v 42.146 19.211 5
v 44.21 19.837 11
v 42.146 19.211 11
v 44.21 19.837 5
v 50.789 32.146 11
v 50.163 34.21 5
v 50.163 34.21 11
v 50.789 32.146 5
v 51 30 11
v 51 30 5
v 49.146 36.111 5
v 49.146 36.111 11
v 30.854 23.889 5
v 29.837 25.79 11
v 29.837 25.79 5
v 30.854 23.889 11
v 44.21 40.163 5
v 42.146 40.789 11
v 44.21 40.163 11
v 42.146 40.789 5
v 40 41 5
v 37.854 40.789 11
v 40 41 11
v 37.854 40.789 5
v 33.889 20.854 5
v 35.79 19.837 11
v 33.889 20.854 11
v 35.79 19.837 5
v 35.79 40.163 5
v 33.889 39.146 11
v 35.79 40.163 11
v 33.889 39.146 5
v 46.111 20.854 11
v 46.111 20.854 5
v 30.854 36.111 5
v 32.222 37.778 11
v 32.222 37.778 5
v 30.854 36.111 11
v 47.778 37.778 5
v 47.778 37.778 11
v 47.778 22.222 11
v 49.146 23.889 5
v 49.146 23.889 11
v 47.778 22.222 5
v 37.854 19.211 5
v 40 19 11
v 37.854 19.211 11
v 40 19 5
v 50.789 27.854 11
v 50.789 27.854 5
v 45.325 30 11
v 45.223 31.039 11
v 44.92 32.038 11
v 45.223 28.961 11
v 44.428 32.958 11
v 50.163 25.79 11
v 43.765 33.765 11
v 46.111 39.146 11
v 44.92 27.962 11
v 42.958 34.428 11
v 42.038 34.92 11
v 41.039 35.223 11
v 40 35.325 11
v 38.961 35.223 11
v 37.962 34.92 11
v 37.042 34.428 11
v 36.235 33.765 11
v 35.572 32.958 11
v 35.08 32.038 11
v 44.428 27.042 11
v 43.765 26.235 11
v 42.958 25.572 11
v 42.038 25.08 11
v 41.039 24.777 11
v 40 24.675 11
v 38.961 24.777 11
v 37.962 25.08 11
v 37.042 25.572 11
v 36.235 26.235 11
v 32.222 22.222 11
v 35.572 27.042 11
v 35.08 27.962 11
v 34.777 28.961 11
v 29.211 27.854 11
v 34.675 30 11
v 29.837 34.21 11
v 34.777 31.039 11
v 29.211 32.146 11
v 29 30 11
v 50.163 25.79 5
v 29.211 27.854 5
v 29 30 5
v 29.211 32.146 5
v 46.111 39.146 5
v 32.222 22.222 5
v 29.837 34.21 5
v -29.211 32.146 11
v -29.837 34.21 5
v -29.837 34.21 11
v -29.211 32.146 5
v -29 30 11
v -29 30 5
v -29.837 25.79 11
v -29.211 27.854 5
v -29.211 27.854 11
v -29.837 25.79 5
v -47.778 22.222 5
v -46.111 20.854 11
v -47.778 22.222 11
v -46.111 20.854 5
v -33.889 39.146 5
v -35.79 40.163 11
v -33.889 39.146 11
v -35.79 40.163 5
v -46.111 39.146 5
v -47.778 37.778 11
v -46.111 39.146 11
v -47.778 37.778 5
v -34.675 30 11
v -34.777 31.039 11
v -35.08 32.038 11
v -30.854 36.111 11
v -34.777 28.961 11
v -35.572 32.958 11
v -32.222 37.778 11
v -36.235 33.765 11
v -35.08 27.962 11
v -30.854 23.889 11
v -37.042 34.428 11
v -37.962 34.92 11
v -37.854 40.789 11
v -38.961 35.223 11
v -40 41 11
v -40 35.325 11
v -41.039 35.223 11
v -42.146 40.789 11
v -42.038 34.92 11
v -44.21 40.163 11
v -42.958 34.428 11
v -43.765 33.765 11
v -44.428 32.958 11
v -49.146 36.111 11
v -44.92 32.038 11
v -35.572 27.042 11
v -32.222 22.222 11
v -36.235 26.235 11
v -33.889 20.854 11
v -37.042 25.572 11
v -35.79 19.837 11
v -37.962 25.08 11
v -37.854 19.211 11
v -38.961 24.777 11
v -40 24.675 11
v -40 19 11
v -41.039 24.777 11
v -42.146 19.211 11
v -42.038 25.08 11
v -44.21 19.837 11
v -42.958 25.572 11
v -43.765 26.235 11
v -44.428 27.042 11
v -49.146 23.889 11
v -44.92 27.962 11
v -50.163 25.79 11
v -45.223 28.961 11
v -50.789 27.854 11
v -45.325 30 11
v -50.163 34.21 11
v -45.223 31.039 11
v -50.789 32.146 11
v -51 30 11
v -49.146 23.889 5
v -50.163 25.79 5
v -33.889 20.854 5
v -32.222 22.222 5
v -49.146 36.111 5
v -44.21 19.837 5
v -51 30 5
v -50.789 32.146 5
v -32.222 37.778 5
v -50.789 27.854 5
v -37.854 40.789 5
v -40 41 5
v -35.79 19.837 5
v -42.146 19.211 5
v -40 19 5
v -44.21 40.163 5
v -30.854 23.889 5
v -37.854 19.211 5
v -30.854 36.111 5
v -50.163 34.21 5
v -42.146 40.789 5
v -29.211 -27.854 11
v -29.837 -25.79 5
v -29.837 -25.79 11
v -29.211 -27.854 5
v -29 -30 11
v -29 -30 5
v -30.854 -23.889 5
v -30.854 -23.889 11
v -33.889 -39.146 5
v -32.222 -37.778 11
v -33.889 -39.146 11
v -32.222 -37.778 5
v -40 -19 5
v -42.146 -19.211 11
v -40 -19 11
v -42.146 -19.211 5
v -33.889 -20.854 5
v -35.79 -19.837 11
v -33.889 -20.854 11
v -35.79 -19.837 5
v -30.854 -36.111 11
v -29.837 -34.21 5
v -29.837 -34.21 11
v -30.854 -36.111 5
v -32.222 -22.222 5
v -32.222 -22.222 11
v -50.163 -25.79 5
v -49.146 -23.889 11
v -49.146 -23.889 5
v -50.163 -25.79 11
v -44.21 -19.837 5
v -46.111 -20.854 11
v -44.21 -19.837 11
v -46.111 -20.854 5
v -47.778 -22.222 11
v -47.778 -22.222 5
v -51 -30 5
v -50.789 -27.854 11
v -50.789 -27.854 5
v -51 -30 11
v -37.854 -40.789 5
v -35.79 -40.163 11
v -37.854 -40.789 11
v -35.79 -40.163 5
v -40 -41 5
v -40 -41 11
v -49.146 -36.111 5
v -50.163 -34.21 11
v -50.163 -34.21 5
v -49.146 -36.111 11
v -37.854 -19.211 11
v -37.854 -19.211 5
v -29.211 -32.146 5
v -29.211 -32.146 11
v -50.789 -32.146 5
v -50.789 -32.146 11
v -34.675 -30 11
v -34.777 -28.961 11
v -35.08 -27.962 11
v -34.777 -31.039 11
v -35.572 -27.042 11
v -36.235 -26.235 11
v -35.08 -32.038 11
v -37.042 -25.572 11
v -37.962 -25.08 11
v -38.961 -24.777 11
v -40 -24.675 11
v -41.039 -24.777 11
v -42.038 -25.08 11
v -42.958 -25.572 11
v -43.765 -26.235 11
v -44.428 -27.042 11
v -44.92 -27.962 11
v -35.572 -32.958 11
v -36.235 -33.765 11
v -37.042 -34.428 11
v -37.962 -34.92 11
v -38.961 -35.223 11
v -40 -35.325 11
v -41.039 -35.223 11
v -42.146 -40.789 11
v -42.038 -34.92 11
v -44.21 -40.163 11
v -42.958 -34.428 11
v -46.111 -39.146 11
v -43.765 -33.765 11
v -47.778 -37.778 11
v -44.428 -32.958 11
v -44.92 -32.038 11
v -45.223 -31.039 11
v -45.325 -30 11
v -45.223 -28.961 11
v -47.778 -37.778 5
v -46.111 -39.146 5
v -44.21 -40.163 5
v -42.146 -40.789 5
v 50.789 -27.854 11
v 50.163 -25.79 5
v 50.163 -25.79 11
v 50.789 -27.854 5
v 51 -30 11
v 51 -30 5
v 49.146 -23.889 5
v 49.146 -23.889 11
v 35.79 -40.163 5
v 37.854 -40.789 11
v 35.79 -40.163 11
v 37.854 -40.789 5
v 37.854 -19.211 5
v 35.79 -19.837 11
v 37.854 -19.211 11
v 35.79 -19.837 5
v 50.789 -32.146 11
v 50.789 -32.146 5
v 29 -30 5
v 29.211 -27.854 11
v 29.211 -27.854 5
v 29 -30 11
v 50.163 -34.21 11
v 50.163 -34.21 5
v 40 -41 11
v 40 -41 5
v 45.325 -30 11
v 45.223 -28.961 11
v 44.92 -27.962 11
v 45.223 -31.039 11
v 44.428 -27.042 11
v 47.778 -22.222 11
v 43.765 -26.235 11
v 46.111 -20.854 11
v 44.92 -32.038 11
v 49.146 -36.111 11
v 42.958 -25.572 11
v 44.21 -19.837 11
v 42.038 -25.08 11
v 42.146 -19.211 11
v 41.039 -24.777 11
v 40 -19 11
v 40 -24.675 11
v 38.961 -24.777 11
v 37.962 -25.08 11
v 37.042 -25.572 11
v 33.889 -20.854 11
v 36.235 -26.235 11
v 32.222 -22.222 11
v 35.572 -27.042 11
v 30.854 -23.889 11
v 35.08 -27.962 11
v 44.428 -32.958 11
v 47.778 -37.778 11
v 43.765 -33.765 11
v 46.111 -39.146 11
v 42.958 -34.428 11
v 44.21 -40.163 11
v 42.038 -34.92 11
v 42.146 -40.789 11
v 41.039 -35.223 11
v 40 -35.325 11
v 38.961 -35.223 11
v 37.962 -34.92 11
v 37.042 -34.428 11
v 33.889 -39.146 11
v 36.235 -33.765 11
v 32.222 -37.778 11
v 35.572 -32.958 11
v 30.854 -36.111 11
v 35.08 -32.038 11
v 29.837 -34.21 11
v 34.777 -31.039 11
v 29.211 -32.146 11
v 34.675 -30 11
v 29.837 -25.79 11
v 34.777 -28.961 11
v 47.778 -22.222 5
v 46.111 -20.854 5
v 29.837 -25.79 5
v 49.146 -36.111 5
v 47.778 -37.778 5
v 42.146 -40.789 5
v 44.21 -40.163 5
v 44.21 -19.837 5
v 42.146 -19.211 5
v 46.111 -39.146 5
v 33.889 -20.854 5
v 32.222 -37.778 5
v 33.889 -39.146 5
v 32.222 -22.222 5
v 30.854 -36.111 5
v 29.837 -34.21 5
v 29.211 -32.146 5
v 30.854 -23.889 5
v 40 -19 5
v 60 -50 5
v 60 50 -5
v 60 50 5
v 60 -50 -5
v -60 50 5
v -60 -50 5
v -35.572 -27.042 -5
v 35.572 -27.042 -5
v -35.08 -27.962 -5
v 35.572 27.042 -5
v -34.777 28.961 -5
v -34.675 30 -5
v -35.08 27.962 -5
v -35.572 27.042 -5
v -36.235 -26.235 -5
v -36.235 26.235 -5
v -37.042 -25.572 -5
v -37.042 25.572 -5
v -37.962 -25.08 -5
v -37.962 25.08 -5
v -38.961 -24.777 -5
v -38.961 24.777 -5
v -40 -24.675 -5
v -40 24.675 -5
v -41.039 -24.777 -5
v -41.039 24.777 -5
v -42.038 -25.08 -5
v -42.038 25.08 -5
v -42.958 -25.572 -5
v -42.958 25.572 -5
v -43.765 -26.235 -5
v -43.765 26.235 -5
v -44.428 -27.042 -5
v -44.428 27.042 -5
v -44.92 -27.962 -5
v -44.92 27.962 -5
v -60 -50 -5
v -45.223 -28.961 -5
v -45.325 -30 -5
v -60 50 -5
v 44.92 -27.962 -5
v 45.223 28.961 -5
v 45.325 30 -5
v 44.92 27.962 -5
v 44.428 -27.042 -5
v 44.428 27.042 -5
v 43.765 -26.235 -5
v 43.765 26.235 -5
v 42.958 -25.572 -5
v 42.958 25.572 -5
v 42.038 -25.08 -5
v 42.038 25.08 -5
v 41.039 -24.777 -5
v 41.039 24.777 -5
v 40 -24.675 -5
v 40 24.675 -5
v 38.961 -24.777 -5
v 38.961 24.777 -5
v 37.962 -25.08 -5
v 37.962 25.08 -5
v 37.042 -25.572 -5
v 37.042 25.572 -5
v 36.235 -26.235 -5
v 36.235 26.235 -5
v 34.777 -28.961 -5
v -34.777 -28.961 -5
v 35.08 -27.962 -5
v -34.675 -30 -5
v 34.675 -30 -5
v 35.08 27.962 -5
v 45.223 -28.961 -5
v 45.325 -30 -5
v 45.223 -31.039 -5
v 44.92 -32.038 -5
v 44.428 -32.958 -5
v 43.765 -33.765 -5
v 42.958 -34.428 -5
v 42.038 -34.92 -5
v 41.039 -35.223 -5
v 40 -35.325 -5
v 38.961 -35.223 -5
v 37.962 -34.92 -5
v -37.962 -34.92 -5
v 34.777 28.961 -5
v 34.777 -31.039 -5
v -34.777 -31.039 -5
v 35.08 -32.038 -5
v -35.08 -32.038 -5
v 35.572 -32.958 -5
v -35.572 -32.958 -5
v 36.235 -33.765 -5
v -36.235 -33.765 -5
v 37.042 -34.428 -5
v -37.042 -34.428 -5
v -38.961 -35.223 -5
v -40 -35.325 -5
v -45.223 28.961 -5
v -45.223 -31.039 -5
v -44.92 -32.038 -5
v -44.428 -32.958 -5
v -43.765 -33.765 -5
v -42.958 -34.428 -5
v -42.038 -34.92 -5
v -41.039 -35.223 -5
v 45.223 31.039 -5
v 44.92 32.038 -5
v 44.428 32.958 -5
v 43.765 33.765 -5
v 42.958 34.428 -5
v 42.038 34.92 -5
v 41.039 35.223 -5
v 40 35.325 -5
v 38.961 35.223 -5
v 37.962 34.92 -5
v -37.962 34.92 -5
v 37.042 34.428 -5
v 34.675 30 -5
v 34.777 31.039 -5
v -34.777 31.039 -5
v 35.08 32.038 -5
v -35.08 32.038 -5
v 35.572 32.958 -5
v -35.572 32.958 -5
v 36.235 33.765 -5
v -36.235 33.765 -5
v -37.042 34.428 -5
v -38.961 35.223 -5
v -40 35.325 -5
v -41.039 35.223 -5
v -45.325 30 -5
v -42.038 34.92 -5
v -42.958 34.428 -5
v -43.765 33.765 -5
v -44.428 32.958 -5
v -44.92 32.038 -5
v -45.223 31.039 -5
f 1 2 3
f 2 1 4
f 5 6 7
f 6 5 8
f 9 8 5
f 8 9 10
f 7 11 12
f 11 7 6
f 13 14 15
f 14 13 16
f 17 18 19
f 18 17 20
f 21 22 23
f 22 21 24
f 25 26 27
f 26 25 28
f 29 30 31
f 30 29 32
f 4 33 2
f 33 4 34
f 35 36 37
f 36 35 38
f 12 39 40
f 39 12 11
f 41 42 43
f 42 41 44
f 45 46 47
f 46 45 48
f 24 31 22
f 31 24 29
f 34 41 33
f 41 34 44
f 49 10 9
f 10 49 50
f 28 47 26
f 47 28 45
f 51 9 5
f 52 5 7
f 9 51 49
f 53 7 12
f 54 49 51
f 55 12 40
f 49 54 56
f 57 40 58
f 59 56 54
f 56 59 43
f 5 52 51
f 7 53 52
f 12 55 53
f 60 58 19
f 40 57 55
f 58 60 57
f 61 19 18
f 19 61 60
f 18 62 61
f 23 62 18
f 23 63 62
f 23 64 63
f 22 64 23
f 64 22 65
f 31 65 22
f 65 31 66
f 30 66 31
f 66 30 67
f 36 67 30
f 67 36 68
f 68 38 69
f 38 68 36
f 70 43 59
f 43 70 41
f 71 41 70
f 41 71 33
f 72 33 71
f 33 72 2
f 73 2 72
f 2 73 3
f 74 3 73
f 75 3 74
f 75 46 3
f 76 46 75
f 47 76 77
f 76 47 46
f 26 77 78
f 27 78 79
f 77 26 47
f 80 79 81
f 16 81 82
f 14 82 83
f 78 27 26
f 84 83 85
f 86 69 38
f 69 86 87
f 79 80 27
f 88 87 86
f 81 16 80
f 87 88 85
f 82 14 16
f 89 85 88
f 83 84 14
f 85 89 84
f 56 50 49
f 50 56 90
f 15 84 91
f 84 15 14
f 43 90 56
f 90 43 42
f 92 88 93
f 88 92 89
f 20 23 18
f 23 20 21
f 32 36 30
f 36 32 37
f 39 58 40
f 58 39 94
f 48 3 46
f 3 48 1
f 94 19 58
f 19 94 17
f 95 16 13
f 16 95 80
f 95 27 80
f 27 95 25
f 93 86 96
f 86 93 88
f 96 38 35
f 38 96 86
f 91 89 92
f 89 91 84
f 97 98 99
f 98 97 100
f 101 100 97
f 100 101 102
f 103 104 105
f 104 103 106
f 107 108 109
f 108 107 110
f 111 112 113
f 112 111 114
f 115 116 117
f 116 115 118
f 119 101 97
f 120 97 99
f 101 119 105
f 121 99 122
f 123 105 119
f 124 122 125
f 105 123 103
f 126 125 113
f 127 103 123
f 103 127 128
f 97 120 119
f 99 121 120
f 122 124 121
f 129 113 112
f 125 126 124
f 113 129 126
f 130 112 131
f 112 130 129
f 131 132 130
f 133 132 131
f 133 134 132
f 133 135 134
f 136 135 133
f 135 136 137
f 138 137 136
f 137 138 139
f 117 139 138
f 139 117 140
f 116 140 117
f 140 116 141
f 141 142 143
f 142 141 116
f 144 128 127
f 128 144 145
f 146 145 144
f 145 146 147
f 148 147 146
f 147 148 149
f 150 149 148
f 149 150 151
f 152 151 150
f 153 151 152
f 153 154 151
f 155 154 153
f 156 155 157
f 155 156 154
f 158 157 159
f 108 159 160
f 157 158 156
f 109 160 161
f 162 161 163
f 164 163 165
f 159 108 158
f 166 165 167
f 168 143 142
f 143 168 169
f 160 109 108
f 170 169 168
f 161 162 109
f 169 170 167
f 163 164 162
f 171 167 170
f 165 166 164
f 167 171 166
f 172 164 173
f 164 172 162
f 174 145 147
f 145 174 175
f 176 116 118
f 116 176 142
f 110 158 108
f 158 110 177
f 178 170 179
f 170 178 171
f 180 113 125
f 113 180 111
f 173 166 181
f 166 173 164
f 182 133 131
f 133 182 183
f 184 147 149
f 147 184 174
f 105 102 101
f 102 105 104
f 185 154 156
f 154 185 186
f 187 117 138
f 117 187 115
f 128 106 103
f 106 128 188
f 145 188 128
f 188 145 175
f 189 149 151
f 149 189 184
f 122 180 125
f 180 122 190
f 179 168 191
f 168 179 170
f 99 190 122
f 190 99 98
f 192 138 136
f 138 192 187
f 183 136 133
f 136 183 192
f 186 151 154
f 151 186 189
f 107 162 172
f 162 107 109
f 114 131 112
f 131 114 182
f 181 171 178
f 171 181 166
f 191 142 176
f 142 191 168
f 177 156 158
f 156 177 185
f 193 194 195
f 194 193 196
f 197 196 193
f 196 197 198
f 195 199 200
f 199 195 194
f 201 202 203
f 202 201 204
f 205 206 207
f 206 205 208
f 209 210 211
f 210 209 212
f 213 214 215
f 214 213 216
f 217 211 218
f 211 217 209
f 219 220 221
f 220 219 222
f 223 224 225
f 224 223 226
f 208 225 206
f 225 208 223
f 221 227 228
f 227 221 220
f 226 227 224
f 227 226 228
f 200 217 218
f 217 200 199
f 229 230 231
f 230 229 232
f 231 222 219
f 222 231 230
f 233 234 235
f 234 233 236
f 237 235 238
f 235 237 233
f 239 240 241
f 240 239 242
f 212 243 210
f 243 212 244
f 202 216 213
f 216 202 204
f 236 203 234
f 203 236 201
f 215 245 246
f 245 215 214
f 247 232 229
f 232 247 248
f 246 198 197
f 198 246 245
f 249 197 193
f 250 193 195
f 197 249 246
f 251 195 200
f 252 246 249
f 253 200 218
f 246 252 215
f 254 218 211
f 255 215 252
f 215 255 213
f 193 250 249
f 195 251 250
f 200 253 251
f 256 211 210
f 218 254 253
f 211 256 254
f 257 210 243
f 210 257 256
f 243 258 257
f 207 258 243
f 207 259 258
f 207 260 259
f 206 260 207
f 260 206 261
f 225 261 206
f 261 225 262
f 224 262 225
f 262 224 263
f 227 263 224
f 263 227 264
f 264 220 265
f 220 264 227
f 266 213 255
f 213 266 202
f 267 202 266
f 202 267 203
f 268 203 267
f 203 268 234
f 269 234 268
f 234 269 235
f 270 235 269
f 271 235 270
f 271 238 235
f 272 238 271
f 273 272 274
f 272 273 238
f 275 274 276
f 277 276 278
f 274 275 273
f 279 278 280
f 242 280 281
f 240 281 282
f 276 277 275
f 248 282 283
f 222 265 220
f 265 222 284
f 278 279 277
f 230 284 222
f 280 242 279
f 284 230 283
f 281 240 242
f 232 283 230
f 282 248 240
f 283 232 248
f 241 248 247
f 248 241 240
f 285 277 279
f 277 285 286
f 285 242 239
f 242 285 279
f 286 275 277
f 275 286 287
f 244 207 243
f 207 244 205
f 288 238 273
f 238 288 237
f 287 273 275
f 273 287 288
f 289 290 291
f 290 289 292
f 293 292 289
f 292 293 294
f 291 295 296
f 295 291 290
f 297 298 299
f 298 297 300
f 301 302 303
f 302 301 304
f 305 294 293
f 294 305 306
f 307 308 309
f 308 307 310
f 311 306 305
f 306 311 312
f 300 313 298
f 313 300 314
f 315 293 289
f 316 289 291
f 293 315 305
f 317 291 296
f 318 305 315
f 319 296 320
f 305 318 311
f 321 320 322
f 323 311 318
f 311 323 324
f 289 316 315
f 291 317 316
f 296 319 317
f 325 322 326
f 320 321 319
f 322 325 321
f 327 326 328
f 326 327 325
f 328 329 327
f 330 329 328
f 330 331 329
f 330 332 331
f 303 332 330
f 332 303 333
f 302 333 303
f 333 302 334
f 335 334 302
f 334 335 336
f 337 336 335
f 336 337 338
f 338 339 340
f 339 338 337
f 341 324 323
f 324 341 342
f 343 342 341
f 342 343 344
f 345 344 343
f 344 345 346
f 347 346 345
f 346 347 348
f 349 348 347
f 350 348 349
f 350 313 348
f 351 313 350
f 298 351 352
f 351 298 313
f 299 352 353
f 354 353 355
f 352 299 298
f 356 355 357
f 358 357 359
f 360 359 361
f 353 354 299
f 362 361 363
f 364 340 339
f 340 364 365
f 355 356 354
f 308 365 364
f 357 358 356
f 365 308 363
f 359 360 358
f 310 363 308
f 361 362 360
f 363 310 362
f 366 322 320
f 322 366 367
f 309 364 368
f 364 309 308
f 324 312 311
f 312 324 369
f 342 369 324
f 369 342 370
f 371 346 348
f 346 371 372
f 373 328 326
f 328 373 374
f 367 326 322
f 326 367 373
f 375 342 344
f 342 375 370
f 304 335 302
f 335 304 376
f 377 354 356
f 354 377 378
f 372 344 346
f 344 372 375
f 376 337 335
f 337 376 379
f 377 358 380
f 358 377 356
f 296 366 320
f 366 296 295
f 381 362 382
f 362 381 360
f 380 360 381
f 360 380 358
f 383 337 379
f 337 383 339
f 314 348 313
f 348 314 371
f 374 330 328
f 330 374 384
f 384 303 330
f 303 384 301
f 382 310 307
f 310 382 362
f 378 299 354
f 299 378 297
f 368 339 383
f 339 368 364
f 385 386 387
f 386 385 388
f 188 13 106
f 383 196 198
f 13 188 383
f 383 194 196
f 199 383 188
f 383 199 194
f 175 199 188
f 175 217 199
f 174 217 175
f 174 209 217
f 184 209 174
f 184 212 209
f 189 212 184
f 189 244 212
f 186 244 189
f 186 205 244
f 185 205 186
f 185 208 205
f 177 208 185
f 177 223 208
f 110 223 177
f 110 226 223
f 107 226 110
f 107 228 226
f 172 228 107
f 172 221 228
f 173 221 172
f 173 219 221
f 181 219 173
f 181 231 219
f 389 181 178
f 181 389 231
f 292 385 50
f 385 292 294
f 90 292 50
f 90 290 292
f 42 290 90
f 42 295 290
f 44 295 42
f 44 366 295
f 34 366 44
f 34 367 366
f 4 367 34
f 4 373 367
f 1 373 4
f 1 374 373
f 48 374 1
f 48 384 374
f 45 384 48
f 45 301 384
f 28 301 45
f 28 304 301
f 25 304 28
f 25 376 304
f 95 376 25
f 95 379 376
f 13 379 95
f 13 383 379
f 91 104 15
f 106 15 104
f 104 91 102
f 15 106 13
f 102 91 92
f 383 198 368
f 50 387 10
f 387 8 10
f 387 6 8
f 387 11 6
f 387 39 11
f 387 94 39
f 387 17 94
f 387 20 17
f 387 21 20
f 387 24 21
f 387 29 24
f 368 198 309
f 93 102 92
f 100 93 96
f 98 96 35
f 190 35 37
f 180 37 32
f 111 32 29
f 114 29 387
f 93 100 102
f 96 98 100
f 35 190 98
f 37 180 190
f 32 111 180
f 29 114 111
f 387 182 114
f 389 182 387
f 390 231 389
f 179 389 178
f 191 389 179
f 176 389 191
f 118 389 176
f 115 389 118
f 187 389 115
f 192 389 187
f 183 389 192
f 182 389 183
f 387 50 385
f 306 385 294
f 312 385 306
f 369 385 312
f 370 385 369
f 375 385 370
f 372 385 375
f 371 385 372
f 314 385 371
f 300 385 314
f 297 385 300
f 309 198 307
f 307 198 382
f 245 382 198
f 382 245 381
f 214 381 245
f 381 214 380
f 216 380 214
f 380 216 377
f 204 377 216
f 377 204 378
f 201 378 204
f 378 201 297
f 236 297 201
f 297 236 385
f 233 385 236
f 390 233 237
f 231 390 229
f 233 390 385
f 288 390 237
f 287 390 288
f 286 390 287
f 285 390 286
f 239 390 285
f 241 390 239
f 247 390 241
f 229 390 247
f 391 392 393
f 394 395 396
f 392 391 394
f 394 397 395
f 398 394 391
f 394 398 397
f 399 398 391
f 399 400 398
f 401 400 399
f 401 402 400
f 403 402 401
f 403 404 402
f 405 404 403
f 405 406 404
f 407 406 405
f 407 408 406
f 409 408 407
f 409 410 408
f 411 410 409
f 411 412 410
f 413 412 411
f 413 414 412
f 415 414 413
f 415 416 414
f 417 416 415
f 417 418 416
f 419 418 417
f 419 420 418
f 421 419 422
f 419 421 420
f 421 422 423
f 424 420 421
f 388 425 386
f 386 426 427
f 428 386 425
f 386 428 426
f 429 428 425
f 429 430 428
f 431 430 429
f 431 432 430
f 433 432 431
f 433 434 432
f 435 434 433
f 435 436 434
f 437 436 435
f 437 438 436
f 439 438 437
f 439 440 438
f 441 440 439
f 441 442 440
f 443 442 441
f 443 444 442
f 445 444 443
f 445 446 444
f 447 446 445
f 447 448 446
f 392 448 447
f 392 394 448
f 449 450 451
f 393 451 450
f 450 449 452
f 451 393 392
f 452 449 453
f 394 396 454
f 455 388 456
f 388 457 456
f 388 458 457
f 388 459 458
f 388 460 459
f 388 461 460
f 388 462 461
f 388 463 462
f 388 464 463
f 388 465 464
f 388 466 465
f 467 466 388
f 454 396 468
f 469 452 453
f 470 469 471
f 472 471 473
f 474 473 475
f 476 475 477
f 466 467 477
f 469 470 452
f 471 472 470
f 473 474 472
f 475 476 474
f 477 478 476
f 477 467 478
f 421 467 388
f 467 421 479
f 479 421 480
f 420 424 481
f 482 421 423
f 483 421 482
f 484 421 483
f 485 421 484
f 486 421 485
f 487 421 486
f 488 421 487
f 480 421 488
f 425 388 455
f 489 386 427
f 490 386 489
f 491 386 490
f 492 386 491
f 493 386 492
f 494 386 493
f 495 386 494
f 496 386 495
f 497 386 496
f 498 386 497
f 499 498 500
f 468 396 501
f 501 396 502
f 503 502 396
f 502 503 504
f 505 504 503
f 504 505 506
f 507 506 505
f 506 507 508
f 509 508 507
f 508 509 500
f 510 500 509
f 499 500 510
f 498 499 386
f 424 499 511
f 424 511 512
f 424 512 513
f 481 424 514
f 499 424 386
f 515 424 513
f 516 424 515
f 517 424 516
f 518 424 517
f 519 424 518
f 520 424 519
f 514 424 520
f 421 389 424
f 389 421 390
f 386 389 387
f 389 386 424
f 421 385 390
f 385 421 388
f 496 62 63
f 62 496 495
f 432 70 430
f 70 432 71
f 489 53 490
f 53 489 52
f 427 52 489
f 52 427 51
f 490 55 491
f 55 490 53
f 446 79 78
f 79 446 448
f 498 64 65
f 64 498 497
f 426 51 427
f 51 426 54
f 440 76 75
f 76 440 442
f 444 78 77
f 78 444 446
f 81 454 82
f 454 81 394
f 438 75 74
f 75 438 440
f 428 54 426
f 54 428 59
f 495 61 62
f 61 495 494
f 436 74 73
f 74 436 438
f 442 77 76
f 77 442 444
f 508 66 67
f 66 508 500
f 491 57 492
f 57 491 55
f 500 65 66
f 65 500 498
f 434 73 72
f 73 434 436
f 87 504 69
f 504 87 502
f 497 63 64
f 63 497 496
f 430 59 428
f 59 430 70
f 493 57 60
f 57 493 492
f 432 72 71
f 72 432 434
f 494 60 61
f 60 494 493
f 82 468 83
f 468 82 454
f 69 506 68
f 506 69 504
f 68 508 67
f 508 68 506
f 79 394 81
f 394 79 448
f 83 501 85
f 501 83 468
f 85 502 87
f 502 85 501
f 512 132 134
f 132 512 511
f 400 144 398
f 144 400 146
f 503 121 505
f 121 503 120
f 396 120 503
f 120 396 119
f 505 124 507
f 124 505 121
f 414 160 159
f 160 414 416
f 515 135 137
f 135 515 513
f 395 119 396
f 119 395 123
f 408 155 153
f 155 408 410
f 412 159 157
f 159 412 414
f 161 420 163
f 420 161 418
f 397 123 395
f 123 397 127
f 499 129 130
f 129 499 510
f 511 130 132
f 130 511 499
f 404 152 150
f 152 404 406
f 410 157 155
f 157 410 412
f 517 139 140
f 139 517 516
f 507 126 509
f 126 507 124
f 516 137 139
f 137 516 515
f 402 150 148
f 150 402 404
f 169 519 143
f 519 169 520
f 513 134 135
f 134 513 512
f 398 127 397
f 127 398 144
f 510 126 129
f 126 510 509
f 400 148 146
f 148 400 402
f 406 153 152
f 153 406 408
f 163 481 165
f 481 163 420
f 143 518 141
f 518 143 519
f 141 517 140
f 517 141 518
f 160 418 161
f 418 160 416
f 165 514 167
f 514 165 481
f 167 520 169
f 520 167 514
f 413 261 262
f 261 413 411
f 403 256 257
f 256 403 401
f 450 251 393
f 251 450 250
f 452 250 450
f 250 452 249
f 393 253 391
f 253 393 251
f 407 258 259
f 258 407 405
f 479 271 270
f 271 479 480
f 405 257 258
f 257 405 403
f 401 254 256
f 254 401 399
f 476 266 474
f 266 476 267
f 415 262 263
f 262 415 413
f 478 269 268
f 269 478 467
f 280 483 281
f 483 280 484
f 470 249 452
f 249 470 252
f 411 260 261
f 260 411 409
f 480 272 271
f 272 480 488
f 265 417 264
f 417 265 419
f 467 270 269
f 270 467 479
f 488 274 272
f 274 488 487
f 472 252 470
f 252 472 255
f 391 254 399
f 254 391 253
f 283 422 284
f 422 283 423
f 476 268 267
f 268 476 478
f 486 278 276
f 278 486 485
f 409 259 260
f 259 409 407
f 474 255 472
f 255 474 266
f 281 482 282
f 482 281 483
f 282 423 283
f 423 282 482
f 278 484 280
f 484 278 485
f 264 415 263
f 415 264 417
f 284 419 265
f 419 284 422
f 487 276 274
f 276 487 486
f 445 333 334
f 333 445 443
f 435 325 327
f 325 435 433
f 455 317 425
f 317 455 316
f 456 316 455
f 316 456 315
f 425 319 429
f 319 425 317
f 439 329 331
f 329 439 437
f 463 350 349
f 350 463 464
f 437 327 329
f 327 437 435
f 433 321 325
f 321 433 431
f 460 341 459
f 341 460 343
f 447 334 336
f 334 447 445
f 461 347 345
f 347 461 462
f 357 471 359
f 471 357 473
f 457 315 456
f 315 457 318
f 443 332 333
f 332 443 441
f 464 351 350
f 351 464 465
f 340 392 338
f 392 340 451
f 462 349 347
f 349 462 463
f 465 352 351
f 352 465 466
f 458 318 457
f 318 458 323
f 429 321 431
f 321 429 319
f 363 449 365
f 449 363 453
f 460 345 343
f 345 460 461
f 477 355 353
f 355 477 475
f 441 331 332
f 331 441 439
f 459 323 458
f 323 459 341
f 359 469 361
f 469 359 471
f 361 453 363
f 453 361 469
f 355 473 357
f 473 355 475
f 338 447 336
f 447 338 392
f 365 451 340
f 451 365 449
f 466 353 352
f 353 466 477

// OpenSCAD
$fn = 32;

// ----------------------------------------------------------------------
// Anchor pads 120 x 100 x 16
// four corner bosses with anchor holes
// ----------------------------------------------------------------------

// --- parameters (mm) ---
plate = [120, 100, 10];  // base plate size (x, y, z)
pads = 4;                // boss count, one per corner
edge = 20;               // boss centre offset from the plate edge
boss_d = 22;             // boss diameter
boss_h = 6;              // boss height above the base plate
bore_d = 10.5;           // nominal hole diameter from the drawing
print_allowance = 0.15;  // clearance added for printing

// --- derived feature positions (mm) ---
hole_d = bore_d + print_allowance;  // = 10.65   hole diameter as printed
height = plate[2] + boss_h;         // = 16   overall height of the part
corner_x = plate[0] / 2 - edge;     // = 40   boss centre X
corner_y = plate[1] / 2 - edge;     // = 30   boss centre Y
feature_centers = [
  [corner_x, corner_y],
  [-corner_x, corner_y],
  [-corner_x, -corner_y],
  [corner_x, -corner_y]
];   // boss centres, anchor holes are drilled there

// base plate, four bosses standing on it, anchor holes all the way through
difference() {
  union() {
    cube(plate, center = true);
    for (centre = feature_centers)
      translate([centre[0], centre[1], plate[2] / 2 - 1])
        cylinder(d = boss_d, h = boss_h + 1);
  }
  for (centre = feature_centers)
    translate([centre[0], centre[1], -height])
      cylinder(d = hole_d, h = 2 * height + 2);  // through boss and plate
}
